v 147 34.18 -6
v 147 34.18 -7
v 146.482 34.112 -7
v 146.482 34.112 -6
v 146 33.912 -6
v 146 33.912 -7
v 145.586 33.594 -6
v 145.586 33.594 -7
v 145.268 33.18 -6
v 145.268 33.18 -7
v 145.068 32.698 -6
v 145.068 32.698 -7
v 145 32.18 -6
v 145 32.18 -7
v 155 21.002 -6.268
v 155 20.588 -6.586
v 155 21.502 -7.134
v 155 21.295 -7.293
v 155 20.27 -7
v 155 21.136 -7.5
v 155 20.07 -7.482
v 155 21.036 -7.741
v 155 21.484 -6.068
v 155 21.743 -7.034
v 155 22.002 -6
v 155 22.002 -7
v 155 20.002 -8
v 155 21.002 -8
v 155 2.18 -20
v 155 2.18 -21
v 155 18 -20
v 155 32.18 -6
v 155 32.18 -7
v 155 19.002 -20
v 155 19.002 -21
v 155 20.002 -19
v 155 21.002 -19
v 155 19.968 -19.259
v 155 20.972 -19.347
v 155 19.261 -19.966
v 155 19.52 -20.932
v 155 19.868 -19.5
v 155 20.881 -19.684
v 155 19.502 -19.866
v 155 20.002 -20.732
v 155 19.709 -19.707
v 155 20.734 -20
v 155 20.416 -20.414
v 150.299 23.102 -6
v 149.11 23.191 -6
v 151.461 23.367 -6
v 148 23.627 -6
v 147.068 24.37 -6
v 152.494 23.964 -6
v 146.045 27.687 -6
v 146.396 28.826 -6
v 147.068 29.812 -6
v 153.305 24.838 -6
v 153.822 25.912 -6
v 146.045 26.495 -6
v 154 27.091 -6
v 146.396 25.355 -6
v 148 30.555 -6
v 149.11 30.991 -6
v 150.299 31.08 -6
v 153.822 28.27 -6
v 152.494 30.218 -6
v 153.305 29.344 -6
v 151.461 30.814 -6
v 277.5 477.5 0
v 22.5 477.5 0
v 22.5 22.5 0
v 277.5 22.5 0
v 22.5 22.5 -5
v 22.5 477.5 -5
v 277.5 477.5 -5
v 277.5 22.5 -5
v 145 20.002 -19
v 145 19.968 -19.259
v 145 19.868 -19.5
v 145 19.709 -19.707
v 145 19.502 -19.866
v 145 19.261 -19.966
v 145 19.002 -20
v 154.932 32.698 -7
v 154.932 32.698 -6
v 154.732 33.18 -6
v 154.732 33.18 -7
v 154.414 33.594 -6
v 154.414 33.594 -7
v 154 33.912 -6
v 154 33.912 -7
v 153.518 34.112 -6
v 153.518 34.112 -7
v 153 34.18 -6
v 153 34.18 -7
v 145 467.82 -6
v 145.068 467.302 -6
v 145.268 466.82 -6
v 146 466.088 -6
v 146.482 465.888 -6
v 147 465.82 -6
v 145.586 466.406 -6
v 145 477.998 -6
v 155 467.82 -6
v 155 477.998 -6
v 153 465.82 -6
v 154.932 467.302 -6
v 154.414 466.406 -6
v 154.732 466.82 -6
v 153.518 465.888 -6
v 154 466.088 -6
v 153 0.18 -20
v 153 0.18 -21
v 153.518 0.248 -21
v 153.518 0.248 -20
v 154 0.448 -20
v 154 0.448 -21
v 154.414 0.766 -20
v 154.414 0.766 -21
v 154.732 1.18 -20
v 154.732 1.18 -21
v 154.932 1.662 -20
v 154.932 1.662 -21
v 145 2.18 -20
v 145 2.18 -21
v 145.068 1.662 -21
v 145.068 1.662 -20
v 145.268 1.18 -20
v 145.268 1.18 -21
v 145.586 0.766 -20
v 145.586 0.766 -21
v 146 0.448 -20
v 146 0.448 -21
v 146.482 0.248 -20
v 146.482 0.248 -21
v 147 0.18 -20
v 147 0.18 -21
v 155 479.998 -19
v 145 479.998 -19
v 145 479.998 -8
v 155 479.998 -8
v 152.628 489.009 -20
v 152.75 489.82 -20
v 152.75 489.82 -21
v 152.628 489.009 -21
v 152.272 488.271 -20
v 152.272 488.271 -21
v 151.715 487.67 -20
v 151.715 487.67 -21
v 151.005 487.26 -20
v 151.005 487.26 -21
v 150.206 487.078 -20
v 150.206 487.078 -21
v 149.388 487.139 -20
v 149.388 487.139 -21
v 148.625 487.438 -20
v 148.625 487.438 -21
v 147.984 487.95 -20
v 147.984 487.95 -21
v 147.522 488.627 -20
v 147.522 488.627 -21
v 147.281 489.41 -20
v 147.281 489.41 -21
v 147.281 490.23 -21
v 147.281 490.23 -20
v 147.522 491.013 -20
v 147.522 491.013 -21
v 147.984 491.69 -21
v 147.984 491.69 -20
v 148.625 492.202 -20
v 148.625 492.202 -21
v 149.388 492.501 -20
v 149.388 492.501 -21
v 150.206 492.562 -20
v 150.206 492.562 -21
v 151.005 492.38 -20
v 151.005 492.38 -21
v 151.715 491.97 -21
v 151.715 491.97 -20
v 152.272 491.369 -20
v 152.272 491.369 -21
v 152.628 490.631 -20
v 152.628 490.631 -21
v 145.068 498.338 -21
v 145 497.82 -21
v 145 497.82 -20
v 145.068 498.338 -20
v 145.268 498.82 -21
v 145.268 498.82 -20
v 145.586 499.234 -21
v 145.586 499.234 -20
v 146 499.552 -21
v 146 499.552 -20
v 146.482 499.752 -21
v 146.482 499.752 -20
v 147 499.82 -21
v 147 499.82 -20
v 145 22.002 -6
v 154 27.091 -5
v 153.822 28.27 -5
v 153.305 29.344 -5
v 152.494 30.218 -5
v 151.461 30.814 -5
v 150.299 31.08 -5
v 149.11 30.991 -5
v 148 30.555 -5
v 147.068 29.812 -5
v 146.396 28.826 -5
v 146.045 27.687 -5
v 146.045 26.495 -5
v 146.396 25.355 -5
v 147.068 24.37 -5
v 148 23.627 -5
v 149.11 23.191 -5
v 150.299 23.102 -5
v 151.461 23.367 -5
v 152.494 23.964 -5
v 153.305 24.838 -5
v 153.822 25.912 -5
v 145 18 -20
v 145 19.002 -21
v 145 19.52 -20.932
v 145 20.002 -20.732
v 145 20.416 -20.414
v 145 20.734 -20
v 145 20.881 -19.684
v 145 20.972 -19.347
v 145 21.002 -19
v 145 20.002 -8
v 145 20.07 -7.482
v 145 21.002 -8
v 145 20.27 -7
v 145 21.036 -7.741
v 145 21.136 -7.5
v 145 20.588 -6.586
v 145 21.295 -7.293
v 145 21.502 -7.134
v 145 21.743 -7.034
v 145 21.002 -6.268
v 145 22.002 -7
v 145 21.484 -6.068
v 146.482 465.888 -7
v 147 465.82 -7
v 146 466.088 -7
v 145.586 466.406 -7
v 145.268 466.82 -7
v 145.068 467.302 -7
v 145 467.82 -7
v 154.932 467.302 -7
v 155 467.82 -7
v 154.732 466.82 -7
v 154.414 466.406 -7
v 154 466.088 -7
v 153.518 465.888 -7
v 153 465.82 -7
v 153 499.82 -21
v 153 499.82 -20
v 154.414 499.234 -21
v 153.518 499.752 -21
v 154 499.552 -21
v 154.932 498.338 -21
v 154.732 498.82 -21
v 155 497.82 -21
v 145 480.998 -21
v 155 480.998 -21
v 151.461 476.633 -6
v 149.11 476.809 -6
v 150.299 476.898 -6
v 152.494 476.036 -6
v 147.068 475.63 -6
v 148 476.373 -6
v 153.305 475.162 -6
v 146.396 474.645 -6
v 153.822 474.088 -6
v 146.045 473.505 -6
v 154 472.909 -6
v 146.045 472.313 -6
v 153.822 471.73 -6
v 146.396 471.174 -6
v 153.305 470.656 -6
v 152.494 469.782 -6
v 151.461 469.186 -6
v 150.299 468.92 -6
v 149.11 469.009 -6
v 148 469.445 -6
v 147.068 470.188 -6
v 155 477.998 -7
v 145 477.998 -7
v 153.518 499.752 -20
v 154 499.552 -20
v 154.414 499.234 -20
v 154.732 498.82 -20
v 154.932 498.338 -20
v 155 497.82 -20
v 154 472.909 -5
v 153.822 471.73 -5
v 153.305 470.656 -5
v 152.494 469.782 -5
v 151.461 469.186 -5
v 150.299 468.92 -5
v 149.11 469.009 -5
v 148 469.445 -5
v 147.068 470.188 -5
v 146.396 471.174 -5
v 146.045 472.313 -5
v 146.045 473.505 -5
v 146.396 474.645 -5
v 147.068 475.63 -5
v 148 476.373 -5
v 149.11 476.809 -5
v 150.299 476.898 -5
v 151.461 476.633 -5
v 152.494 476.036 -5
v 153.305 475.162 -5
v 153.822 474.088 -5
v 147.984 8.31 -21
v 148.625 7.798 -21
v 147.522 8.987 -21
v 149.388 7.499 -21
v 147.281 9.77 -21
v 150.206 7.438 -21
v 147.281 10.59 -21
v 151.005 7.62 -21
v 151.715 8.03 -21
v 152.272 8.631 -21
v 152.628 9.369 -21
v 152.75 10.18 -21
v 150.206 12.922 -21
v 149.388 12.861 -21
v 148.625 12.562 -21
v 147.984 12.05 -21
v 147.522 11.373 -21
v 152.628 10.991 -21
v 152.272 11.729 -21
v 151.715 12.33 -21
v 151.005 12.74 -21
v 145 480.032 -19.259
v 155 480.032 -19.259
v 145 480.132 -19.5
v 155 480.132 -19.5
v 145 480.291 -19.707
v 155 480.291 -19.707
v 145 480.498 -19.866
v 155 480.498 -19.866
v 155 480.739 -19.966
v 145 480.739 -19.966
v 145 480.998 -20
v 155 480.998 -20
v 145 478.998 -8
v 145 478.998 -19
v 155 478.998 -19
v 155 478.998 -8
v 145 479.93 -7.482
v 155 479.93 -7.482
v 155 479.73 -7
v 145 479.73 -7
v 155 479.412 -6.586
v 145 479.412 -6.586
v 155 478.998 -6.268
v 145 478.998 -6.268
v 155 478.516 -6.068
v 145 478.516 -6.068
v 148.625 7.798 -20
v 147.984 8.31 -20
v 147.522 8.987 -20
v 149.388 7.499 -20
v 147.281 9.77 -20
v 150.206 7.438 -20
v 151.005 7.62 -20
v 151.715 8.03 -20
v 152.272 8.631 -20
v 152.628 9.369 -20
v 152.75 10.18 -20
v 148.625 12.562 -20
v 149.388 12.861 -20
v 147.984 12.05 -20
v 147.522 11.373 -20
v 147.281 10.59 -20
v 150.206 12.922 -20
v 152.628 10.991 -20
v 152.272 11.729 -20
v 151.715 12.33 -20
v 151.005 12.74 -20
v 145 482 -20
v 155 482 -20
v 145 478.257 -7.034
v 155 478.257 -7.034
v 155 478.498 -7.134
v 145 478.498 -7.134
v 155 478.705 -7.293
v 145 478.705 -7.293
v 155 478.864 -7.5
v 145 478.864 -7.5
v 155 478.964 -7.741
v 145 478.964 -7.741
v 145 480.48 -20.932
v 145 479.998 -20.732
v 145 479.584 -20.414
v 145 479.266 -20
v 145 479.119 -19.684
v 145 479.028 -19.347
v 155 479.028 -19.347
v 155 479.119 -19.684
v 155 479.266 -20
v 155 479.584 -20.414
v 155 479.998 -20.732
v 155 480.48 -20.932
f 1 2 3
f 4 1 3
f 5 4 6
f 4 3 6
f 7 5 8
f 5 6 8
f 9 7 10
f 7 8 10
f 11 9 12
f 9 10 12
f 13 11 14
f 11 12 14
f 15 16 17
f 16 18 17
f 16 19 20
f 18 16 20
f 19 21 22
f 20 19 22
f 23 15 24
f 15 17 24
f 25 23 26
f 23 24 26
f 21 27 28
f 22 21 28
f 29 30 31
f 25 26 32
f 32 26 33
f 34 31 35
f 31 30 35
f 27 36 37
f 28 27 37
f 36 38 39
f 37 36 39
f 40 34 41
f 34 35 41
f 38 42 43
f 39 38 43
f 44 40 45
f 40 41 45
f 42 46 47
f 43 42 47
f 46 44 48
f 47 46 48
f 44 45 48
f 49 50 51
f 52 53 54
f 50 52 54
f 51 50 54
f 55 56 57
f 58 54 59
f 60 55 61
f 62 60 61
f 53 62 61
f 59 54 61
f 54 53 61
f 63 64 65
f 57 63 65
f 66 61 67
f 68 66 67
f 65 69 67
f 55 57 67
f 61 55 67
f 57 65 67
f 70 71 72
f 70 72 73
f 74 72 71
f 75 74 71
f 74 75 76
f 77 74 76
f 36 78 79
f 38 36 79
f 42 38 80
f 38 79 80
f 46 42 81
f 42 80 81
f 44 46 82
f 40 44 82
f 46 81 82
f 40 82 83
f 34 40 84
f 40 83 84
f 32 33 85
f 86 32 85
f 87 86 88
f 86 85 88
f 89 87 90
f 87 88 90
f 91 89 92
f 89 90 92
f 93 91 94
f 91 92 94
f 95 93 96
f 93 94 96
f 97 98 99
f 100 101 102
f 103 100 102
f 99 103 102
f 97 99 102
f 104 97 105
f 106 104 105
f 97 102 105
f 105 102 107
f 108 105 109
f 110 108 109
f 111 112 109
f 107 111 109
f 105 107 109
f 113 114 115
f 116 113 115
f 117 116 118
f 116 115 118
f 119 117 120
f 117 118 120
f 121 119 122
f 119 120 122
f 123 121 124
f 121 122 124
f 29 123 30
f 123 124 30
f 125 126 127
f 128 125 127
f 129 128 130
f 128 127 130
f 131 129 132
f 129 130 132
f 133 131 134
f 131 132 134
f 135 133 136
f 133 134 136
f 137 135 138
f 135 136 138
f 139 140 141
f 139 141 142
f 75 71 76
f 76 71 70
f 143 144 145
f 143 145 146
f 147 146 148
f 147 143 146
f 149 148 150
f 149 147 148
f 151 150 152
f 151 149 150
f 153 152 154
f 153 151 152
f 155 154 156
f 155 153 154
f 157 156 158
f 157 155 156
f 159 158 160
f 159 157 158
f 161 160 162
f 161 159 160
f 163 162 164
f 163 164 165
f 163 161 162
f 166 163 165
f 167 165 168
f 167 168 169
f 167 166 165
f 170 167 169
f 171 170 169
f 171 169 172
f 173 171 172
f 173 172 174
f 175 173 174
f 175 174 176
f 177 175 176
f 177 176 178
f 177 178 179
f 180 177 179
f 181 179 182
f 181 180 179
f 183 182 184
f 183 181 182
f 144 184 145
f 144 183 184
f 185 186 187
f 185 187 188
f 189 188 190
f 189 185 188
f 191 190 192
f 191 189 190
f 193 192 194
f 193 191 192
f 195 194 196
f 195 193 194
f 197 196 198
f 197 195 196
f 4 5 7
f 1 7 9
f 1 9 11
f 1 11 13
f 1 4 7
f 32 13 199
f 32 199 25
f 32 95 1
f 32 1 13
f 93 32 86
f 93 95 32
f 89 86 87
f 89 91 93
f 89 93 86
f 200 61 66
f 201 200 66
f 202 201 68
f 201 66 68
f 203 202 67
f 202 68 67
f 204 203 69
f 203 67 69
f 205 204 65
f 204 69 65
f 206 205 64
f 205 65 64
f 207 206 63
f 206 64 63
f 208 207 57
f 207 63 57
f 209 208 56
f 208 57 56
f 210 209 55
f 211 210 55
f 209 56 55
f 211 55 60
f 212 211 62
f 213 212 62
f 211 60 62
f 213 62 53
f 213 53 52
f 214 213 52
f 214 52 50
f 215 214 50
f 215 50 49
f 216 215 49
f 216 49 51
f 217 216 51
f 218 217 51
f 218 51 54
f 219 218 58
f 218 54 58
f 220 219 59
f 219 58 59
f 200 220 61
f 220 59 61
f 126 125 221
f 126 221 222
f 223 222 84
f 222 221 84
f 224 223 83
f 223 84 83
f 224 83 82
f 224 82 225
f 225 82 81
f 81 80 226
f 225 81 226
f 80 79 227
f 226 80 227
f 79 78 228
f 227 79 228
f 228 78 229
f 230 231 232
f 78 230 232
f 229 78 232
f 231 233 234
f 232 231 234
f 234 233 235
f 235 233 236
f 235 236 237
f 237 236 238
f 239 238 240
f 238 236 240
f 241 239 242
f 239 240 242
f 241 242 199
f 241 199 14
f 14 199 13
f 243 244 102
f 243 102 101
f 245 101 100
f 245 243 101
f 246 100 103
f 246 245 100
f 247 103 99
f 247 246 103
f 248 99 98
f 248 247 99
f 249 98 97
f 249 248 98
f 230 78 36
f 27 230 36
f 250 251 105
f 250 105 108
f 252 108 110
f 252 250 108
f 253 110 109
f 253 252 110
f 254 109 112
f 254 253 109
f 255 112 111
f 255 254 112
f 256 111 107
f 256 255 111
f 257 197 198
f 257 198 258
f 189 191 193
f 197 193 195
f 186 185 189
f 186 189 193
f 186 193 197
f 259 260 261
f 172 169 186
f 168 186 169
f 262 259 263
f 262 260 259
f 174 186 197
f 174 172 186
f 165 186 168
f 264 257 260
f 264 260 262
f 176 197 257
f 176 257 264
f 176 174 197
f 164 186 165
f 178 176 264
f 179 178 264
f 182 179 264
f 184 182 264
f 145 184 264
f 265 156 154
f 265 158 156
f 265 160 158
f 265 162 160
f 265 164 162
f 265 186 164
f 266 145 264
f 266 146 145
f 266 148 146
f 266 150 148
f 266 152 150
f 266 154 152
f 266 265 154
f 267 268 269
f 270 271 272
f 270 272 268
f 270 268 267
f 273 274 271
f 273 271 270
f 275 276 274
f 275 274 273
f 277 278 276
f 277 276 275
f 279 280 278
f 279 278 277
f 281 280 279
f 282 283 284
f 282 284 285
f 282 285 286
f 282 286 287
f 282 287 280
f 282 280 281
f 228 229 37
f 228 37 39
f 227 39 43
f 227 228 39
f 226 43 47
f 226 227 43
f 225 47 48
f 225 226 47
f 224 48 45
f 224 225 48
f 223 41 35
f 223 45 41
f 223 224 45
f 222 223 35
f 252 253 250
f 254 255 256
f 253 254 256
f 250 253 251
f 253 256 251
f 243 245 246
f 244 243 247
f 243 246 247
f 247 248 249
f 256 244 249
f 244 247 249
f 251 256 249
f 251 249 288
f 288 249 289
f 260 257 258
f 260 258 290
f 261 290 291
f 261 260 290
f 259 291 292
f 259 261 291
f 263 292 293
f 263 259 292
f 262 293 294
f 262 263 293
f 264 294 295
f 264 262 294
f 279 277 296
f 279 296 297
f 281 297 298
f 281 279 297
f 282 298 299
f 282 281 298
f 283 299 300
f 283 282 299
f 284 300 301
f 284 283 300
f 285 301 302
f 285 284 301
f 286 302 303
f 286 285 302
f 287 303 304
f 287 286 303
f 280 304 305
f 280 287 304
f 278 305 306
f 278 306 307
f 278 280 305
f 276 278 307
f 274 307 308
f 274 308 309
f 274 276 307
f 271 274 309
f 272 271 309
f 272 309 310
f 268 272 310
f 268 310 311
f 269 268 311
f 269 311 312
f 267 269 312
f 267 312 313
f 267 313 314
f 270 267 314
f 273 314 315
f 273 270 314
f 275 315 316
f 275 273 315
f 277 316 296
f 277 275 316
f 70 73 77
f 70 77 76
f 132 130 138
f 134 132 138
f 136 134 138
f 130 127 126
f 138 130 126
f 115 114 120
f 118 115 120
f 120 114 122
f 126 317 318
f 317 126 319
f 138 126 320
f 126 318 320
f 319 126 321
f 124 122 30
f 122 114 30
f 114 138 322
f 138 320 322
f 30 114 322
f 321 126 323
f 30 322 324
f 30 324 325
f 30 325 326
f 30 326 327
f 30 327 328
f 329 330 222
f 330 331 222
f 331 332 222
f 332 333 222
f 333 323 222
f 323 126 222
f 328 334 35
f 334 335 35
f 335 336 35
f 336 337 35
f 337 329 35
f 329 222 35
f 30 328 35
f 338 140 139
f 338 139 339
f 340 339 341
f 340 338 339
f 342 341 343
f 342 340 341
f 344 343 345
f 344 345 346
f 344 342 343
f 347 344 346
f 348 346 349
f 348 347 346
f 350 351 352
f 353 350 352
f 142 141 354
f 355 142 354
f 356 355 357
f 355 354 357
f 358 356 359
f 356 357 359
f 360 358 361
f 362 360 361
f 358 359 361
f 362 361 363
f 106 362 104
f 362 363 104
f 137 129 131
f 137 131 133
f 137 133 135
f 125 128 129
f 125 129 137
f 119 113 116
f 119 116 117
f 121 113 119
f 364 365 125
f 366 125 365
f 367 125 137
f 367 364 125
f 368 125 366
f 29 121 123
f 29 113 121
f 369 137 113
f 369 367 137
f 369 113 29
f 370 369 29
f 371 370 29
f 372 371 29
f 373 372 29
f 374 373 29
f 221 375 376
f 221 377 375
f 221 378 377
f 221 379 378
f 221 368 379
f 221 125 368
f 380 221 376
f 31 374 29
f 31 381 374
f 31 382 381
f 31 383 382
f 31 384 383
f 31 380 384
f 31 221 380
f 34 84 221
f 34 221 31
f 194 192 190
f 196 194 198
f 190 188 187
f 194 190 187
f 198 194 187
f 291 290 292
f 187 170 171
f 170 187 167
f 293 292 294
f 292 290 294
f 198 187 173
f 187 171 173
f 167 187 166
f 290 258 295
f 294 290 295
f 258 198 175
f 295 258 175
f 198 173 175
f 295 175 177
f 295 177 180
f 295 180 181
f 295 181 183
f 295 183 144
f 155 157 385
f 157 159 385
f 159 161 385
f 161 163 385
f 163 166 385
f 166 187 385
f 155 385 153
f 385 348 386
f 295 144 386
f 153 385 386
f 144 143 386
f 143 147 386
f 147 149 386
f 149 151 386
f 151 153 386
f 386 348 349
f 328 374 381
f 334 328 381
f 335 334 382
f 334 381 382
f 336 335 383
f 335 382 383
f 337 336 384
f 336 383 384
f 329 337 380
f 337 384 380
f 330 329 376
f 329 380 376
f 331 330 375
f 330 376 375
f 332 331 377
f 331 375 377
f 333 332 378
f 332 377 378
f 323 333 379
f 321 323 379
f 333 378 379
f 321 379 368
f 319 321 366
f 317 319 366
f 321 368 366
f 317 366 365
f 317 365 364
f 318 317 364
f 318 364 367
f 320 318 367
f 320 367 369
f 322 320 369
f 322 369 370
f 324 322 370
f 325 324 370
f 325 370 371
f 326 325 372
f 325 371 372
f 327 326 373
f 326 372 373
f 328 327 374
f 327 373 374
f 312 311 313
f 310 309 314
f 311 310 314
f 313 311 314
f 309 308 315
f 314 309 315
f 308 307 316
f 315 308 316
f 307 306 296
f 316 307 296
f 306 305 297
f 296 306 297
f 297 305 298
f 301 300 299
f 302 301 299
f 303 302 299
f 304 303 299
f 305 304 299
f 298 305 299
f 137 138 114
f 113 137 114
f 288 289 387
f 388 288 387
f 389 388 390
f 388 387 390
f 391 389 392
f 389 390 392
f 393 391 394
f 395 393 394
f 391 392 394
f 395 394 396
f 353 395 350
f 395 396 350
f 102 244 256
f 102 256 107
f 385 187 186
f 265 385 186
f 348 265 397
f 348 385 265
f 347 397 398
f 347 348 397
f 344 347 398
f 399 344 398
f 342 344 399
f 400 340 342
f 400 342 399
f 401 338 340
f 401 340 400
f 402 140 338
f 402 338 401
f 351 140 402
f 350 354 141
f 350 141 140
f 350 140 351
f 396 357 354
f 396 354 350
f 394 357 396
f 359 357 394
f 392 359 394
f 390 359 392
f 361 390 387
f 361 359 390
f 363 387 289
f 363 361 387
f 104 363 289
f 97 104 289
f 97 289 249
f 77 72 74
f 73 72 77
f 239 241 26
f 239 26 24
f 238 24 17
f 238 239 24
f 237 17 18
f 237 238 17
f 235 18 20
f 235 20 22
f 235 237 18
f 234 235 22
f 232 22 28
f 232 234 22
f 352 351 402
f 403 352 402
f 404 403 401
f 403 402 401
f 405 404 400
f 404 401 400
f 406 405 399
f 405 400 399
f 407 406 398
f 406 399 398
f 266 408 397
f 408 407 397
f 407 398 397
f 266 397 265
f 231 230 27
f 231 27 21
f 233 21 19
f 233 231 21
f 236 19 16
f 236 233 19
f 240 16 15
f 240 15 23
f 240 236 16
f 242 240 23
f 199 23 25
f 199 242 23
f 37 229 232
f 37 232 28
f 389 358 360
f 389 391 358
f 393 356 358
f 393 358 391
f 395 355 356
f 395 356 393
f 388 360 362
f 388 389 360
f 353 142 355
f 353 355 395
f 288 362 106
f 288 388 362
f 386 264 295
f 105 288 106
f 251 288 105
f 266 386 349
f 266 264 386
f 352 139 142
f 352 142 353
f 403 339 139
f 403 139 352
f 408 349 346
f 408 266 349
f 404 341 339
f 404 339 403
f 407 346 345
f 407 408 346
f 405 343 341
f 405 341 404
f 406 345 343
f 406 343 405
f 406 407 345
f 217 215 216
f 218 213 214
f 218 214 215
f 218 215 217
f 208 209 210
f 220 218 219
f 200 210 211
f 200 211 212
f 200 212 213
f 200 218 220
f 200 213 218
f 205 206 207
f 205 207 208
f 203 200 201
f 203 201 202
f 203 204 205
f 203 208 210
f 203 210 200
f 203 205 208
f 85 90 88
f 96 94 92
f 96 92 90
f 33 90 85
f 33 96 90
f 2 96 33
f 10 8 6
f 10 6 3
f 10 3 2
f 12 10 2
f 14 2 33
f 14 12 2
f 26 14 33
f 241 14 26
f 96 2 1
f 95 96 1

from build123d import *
from build123d.topology import SkipClean

# Parameters (mm, degrees)
SKETCH1_W           = 255
SKETCH1_H           = 455
BOSS_EXTRUDE1_DEPTH = 5
BASE_FLANGE2_DEPTH  = 1
JOG1_START          = 145
JOG1_DEPTH          = 10
JOG1_START_2        = 147
JOG1_2_DEPTH        = 6
JOG1_START_3        = -8
JOG1_3_DEPTH        = 1.976704963
JOG1_START_4        = -20
JOG1_4_OUTLINE_W    = 2
JOG1_4_OUTLINE_H    = 1
JOG1_4_DEPTH        = 12.160683996
JOG1_START_5        = -7
JOG1_5_DEPTH        = 1
JOG1_6_DEPTH        = 10
JOG1_7_DEPTH        = 10
SKETCH16_R          = 2.75
CUT_EXTRUDE2_DEPTH  = 1
SKETCH17_R          = 4
BOSS_EXTRUDE2_DEPTH = 1


with BuildPart() as part:
    # Sketch1 → Boss-Extrude1 (new body)
    with BuildSketch(Plane.XY):
        with Locations((150, 250)):
            Rectangle(SKETCH1_W, SKETCH1_H)
    extrude(amount=-BOSS_EXTRUDE1_DEPTH)


with BuildPart() as body_2:
    # Base-Flange2: sheet metal written as solids
    # Sketch8 → Base-Flange2 (new body)
    with BuildSketch(Plane(origin=(0, 0, -21), x_dir=(-1, 0, 0), z_dir=(0, 0, -1))):
        with BuildLine():
            Line((-153, 34.18), (-147, 34.18))
            ThreePointArc((-147, 34.18), (-145.585786438, 33.594213562), (-145, 32.18))
            Line((-145, 32.18), (-145, 2.18))
            ThreePointArc((-145, 2.18), (-145.585786438, 0.765786438), (-147, 0.18))
            Line((-147, 0.18), (-153, 0.18))
            ThreePointArc((-153, 0.18), (-154.414213562, 0.765786438), (-155, 2.18))
            Line((-155, 2.18), (-155, 32.18))
            ThreePointArc((-155, 32.18), (-154.414213562, 33.594213562), (-153, 34.18))
        make_face()
    extrude(amount=-BASE_FLANGE2_DEPTH)

    # Jog1: read off the stored shape, not the designer's step
    # Jog1 outline → Jog1 (cut)
    with BuildSketch(Plane.YZ.offset(JOG1_START)):
        with BuildLine():
            Line((34.18, -20), (20.733953562, -20))
            ThreePointArc((20.733953562, -20), (20.001902755, -20.732050807), (19.001902755, -21))
            Line((19.001902755, -21), (34.18, -21))
            Line((34.18, -21), (34.18, -20))
        make_face()
    extrude(amount=JOG1_DEPTH, mode=Mode.SUBTRACT)

    # Jog1 2 outline → Jog1 2 (add)
    with BuildSketch(Plane.YZ.offset(JOG1_START_2)):
        with BuildLine():
            Line((20.001902755, -8), (20.001902755, -19))
            ThreePointArc((20.001902755, -19), (19.709009536, -19.707106781), (19.001902755, -20))
            Line((19.001902755, -20), (20.733953562, -20))
            ThreePointArc((20.733953562, -20), (20.933754407, -19.51763809), (21.001902755, -19))
            Line((21.001902755, -19), (21.001902755, -8))
            ThreePointArc((21.001902755, -8), (21.294795974, -7.292893219), (22.001902755, -7))
            Line((22.001902755, -7), (34.18, -7))
            Line((34.18, -7), (34.18, -6))
            Line((34.18, -6), (22.001902755, -6))
            ThreePointArc((22.001902755, -6), (20.587689193, -6.585786438), (20.001902755, -8))
        make_face()
    extrude(amount=JOG1_2_DEPTH)

    # Jog1 3 outline → Jog1 3 (add)
    with BuildSketch(Plane.XY.offset(JOG1_START_3)):
        with BuildLine():
            Line((145, 20.001902755), (147, 20.001902755))
            Line((147, 20.001902755), (147, 34.18))
            ThreePointArc((147, 34.18), (145.585786438, 33.594213562), (145, 32.18))
            Line((145, 32.18), (145, 20.001902755))
        make_face()
        with BuildLine():
            Line((153, 20.001902755), (155, 20.001902755))
            Line((155, 20.001902755), (155, 32.18))
            ThreePointArc((155, 32.18), (154.414213562, 33.594213562), (153, 34.18))
            Line((153, 34.18), (153, 20.001902755))
        make_face()
    extrude(amount=JOG1_3_DEPTH)

    # Jog1 4 outline → Jog1 4 (add)
    with BuildSketch(Plane.XY.offset(JOG1_START_4)):
        with Locations((146, 20.501902755)):
            Rectangle(JOG1_4_OUTLINE_W, JOG1_4_OUTLINE_H)
        with Locations((154, 20.501902755)):
            Rectangle(JOG1_4_OUTLINE_W, JOG1_4_OUTLINE_H)
    extrude(amount=JOG1_4_DEPTH)

    # Jog1 5 outline → Jog1 5 (add)
    with BuildSketch(Plane.XY.offset(JOG1_START_5)):
        with BuildLine():
            Line((145, 32.18), (145, 21.001902755))
            Line((145, 21.001902755), (147, 21.001902755))
            Line((147, 21.001902755), (147, 34.18))
            ThreePointArc((147, 34.18), (145.585786438, 33.594213562), (145, 32.18))
        make_face()
        with BuildLine():
            Line((153, 34.18), (153, 21.001902755))
            Line((153, 21.001902755), (155, 21.001902755))
            Line((155, 21.001902755), (155, 32.18))
            ThreePointArc((155, 32.18), (154.414213562, 33.594213562), (153, 34.18))
        make_face()
    extrude(amount=JOG1_5_DEPTH)

    # Jog1 6 outline → Jog1 6 (cut)
    with SkipClean():  # the faces are left unmerged after this step: merging them gives an invalid solid
        with BuildSketch(Plane.YZ.offset(JOG1_START)):
            with BuildLine():
                Line((20.001902755, -6.023295037), (20.001902755, -8))
                ThreePointArc((20.001902755, -8), (20.587689193, -6.585786438), (22.001902755, -6))
                Line((22.001902755, -6), (36, -5.999999991))
                Line((36, -5.999999991), (36, -5))
                Line((36, -5), (21.001902764, -5))
                Line((21.001902764, -5), (21.001902763, -6))
                Line((21.001902763, -6), (21.001902755, -6.023295037))
                Line((21.001902755, -6.023295037), (20.001902755, -6.023295037))
            make_face()
            with BuildLine():
                ThreePointArc((20.733953562, -20), (20.416116315, -20.414213564), (20.001902751, -20.732050809))
                Line((20.001902751, -20.732050809), (20.001902747, -21))
                Line((20.001902747, -21), (36, -21))
                Line((36, -21), (36, -7))
                Line((36, -7), (22.001902755, -7))
                ThreePointArc((22.001902755, -7), (21.294795974, -7.292893219), (21.001902755, -8))
                Line((21.001902755, -8), (21.001902755, -19))
                ThreePointArc((21.001902755, -19), (20.933754407, -19.51763809), (20.733953562, -20))
            make_face()
        extrude(amount=JOG1_6_DEPTH, mode=Mode.SUBTRACT)
    add(body_2.part.scale(1), mode=Mode.REPLACE)  # the faces are merged on a copy

    # Jog1 7 outline → Jog1 7 (add)
    with BuildSketch(Plane.YZ.offset(JOG1_START)):
        with BuildLine():
            Line((20.001902755, -20), (20.001902755, -19))
            ThreePointArc((20.001902755, -19), (19.709009536, -19.707106781), (19.001902755, -20))
            Line((19.001902755, -20), (18, -20.000000001))
            Line((18, -20.000000001), (18, -21))
            Line((18, -21), (19.001902755, -21))
            ThreePointArc((19.001902755, -21), (19.519540843, -20.931851653), (20.001902751, -20.732050809))
            Line((20.001902751, -20.732050809), (20.001902755, -20))
        make_face()
    extrude(amount=JOG1_7_DEPTH)

    # Sketch16 → Cut-Extrude2 (cut)
    with BuildSketch(Plane.XY.offset(-20)):
        with Locations((150, 10.18)):
            Circle(SKETCH16_R)
    extrude(amount=-CUT_EXTRUDE2_DEPTH, mode=Mode.SUBTRACT)


with BuildPart() as body_3:
    # Sketch17 → Boss-Extrude2 (new body)
    with BuildSketch(Plane.XY.offset(-6)):
        with Locations((150, 27.090951377)):
            Circle(SKETCH17_R)
    extrude(amount=BOSS_EXTRUDE2_DEPTH)


with BuildPart() as body_4:
    # Mirror1: mirrored copy
    add(body_2.part.mirror(Plane(origin=(0, 250, 0), x_dir=(0, 0, 1), z_dir=(0, -1, 0))))


with BuildPart() as body_5:
    # Mirror1 2: mirrored copy
    add(body_3.part.mirror(Plane(origin=(0, 250, 0), x_dir=(0, 0, 1), z_dir=(0, -1, 0))))


solid = Compound([part.part, body_2.part, body_3.part, body_4.part, body_5.part])
